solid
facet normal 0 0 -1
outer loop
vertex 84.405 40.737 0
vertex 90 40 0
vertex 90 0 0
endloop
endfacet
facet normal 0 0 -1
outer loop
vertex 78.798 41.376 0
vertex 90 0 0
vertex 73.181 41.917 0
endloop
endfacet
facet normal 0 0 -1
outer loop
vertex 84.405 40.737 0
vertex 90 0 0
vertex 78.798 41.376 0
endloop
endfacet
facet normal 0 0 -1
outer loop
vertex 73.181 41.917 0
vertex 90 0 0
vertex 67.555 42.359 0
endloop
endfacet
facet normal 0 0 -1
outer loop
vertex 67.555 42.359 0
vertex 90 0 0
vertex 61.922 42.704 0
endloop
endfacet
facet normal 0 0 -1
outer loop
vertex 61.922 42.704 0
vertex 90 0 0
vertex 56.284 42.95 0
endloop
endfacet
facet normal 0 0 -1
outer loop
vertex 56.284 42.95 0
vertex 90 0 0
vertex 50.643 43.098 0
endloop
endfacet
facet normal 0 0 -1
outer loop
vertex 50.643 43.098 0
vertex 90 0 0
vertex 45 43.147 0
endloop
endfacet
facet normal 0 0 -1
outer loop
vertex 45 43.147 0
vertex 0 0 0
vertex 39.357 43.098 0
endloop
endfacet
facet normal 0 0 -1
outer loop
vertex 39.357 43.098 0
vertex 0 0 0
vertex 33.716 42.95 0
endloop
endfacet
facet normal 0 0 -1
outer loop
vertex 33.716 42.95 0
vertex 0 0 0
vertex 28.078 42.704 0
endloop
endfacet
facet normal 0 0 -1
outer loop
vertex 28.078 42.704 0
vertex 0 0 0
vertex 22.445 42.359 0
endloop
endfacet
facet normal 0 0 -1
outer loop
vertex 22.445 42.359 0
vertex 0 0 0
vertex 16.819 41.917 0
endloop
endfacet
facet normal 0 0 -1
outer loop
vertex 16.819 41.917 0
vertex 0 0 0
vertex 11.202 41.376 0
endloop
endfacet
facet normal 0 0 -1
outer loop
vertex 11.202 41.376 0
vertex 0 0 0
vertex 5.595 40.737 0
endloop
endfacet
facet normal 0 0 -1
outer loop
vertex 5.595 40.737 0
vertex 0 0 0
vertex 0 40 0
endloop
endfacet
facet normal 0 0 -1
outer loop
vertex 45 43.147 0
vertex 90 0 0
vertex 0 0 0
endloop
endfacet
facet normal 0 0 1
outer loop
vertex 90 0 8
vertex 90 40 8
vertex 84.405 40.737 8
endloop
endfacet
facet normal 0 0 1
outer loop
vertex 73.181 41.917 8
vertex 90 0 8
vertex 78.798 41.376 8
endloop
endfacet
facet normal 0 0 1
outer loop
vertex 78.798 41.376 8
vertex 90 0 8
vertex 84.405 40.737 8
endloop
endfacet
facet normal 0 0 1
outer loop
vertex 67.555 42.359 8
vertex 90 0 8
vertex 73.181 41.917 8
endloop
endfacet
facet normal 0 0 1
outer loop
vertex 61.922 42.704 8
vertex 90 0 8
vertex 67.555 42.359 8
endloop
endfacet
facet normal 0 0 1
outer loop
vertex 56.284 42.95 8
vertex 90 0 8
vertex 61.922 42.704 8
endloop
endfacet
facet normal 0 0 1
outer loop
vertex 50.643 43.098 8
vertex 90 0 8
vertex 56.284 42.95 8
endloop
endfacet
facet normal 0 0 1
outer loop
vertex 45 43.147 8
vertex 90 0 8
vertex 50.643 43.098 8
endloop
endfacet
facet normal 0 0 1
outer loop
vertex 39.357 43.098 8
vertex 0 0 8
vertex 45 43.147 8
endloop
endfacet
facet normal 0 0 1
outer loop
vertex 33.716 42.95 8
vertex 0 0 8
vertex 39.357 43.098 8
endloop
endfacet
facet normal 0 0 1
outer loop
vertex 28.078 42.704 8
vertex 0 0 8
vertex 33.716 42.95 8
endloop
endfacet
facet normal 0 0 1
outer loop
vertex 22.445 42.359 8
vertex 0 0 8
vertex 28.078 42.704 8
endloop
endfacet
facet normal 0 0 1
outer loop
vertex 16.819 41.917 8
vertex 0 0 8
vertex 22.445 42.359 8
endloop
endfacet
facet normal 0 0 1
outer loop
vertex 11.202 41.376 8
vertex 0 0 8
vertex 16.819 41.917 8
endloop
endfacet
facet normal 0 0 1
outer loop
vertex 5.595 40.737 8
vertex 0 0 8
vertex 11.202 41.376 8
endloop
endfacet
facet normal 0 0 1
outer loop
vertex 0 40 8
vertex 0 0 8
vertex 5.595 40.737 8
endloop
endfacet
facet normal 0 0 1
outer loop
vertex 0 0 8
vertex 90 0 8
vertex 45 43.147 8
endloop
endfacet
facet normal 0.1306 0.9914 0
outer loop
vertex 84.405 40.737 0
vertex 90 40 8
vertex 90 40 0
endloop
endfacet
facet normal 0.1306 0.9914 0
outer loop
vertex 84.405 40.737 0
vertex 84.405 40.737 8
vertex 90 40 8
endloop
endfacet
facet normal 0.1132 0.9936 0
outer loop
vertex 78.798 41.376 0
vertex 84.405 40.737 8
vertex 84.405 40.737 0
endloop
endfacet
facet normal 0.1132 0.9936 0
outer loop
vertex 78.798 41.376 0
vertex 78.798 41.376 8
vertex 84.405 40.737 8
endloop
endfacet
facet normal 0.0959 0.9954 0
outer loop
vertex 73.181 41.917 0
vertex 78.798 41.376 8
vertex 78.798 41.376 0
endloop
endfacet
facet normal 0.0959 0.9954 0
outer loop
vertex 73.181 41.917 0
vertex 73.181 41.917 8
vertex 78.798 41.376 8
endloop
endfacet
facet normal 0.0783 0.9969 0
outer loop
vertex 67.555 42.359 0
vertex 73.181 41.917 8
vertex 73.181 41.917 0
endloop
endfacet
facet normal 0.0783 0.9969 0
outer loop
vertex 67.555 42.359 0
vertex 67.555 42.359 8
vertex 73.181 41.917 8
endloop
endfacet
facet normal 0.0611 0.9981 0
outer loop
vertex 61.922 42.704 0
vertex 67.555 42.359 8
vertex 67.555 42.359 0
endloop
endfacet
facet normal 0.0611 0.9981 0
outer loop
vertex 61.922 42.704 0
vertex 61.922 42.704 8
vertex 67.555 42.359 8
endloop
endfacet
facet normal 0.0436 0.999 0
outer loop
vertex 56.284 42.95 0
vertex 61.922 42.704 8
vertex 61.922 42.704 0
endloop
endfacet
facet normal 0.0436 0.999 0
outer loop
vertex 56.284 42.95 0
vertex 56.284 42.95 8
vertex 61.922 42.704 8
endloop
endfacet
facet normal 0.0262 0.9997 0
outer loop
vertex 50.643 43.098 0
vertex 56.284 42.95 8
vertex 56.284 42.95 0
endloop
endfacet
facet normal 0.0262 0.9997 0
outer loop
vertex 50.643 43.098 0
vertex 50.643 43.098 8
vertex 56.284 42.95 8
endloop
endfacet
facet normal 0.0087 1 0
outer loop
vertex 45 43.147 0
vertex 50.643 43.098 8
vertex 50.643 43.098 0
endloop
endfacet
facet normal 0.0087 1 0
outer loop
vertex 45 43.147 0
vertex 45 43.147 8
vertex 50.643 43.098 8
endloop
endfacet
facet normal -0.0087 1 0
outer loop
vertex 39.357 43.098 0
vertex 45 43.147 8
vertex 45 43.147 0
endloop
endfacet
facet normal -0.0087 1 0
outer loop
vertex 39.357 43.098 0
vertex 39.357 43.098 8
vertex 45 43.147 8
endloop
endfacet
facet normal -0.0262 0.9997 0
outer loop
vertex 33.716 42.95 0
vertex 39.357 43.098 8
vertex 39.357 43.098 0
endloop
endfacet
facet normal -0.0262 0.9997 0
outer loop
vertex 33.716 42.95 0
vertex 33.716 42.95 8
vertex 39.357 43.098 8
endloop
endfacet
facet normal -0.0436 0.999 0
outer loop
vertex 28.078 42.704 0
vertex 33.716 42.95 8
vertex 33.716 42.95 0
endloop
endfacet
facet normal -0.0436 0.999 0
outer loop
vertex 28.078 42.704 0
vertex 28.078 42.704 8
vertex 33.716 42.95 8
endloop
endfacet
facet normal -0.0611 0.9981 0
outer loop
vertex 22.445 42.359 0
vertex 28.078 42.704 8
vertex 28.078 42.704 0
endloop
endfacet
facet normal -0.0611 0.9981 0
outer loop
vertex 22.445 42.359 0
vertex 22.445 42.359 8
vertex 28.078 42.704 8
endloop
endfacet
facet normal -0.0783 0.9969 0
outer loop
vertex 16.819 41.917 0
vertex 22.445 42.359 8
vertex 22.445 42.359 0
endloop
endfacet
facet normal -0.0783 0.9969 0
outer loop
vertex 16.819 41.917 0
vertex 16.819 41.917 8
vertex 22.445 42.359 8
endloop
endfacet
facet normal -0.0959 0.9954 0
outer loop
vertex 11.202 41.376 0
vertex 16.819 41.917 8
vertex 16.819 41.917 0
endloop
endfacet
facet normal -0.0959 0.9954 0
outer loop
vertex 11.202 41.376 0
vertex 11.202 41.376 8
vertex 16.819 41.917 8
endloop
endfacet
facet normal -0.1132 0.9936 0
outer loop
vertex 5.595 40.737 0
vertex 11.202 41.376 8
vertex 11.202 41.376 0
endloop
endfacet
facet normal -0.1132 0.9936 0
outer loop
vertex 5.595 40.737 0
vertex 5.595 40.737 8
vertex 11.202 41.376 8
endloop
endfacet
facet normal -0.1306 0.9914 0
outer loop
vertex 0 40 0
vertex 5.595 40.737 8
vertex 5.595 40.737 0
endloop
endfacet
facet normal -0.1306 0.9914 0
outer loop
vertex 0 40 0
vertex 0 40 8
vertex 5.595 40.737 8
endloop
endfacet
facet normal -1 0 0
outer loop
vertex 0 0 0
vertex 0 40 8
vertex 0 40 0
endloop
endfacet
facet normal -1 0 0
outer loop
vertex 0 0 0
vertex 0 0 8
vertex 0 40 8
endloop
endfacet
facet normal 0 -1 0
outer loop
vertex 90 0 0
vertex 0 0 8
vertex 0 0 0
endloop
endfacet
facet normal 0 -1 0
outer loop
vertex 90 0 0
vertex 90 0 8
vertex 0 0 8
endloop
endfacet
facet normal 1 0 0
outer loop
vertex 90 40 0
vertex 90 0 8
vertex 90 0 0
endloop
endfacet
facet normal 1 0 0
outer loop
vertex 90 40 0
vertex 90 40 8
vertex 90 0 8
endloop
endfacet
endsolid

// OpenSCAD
$fn = 32;

// ----------------------------------------------------------------------
// Arc profile plate: crown, 19 points
// ----------------------------------------------------------------------

// --- parameters (mm) ---
bar_l = 90;               // bar length, X
bar_w = 40;               // bar height at the ends, Y
arc_r = 323.34;           // radius of the crown arc
arc_angle = 16;           // crown arc angle, degrees
crown_rise = 3.15;        // rise of the crown over the ends
arc_step = 1;             // sampling step of the crown arc, degrees
plate_t = 8;              // plate thickness, Z

bbox_y = bar_w + crown_rise;  // full height with the crown

profile = [[90, 40], [84.405, 40.737], [78.798, 41.376], [73.181, 41.917], [67.555, 42.359], [61.922, 42.704], [56.284, 42.95], [50.643, 43.098], [45, 43.147], [39.357, 43.098], [33.716, 42.95], [28.078, 42.704], [22.445, 42.359], [16.819, 41.917], [11.202, 41.376], [5.595, 40.737], [0, 40], [0, 0], [90, 0]];  // primary outline, 19 points, counter clockwise

// --- the one profile operation ---
linear_extrude(height = plate_t) polygon(points = profile);
